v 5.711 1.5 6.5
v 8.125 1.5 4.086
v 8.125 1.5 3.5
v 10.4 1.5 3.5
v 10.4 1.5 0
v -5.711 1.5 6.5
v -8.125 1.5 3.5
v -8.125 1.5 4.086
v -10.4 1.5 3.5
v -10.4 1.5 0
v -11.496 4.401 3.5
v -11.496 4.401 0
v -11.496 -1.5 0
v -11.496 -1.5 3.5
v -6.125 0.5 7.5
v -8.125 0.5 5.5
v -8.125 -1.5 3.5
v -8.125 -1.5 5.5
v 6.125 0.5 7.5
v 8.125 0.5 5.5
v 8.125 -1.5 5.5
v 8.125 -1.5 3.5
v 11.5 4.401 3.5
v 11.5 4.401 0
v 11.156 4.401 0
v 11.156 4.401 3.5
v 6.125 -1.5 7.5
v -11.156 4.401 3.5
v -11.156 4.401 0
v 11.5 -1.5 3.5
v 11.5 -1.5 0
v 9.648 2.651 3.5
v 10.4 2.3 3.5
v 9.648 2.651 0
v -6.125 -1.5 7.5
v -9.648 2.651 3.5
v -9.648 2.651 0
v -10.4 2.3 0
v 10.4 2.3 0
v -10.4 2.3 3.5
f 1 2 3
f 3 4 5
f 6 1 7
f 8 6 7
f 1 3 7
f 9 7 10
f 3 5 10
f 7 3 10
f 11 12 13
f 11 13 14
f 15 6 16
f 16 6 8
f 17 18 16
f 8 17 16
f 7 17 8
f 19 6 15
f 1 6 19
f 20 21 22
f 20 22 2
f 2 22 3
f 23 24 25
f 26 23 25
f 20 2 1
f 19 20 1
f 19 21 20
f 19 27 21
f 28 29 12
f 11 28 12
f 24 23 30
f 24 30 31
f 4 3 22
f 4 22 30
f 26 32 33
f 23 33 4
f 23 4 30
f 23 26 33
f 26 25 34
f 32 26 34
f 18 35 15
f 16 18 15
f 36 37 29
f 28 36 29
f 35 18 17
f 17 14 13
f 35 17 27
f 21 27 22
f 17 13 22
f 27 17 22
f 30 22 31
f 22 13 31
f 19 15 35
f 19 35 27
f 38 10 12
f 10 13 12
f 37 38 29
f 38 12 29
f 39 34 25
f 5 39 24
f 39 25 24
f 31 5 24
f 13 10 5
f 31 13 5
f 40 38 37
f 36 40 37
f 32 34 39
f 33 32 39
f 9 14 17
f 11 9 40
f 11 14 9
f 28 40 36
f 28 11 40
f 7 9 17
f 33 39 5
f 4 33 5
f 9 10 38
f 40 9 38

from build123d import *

# Parameters (mm, degrees)
RESSALTO_EXTRUS_O1_DEPTH = 3.5
ESBO_O3_W                = 3.5
ESBO_O3_H                = 5.900568868
CORTE_EXTRUS_O1_DEPTH    = 0.5
ESBO_O4_W                = 3.5
ESBO_O4_H                = 5.900568868
CORTE_EXTRUS_O2_DEPTH    = 0.5
ESBO_O5_W                = 16.25
ESBO_O5_H                = 3
RESSALTO_EXTRUS_O2_DEPTH = 4
CHANFRO1_SIZE            = 2
CHANFRO4_SIZE            = 1


with BuildPart() as part:
    # Esboço2 → Ressalto-extrusão1 (new body)
    with BuildSketch(Plane.XY):
        Polygon((12, 4.400568868), (11.156062048, 4.400568868), (9.648231551, 2.650555385), (10.4, 2.3), (10.4, 1.5), (-10.4, 1.5), (-10.4, 2.3), (-9.648231551, 2.650555385), (-11.156062048, 4.400568868), (-11.996, 4.400568868), (-11.996, -1.5), (12, -1.5), align=None)
    extrude(amount=RESSALTO_EXTRUS_O1_DEPTH)

    # Esboço3 → Corte-extrusão1 (cut)
    with BuildSketch(Plane(origin=(12, 0, 0), x_dir=(0, 0, -1), z_dir=(1, 0, 0))):
        with Locations((-1.75, 1.450284434)):
            Rectangle(ESBO_O3_W, ESBO_O3_H)
    extrude(amount=-CORTE_EXTRUS_O1_DEPTH, mode=Mode.SUBTRACT)

    # Esboço4 → Corte-extrusão2 (cut)
    with BuildSketch(Plane.ZY.offset(11.996)):
        with Locations((1.75, 1.450284434)):
            Rectangle(ESBO_O4_W, ESBO_O4_H)
    extrude(amount=-CORTE_EXTRUS_O2_DEPTH, mode=Mode.SUBTRACT)

    # Esboço5 → Ressalto-extrusão2 (add)
    with BuildSketch(Plane.XY.offset(3.5)):
        Rectangle(ESBO_O5_W, ESBO_O5_H)
    extrude(amount=RESSALTO_EXTRUS_O2_DEPTH)

    # Chanfro1
    chanfro1_edges = [part.edges().sort_by_distance(p)[0] for p in [
        (8.125, 0, 7.5),
        (-8.125, 0, 7.5),
    ]]
    chamfer(chanfro1_edges, length=CHANFRO1_SIZE)

    # Chanfro4
    chanfro4_edges = [part.edges().sort_by_distance(p)[0] for p in [
        (0, 1.5, 7.5),
        (7.125, 1.5, 6.5),
        (-7.125, 1.5, 6.5),
    ]]
    chamfer(chanfro4_edges, length=CHANFRO4_SIZE)


solid = part.part
